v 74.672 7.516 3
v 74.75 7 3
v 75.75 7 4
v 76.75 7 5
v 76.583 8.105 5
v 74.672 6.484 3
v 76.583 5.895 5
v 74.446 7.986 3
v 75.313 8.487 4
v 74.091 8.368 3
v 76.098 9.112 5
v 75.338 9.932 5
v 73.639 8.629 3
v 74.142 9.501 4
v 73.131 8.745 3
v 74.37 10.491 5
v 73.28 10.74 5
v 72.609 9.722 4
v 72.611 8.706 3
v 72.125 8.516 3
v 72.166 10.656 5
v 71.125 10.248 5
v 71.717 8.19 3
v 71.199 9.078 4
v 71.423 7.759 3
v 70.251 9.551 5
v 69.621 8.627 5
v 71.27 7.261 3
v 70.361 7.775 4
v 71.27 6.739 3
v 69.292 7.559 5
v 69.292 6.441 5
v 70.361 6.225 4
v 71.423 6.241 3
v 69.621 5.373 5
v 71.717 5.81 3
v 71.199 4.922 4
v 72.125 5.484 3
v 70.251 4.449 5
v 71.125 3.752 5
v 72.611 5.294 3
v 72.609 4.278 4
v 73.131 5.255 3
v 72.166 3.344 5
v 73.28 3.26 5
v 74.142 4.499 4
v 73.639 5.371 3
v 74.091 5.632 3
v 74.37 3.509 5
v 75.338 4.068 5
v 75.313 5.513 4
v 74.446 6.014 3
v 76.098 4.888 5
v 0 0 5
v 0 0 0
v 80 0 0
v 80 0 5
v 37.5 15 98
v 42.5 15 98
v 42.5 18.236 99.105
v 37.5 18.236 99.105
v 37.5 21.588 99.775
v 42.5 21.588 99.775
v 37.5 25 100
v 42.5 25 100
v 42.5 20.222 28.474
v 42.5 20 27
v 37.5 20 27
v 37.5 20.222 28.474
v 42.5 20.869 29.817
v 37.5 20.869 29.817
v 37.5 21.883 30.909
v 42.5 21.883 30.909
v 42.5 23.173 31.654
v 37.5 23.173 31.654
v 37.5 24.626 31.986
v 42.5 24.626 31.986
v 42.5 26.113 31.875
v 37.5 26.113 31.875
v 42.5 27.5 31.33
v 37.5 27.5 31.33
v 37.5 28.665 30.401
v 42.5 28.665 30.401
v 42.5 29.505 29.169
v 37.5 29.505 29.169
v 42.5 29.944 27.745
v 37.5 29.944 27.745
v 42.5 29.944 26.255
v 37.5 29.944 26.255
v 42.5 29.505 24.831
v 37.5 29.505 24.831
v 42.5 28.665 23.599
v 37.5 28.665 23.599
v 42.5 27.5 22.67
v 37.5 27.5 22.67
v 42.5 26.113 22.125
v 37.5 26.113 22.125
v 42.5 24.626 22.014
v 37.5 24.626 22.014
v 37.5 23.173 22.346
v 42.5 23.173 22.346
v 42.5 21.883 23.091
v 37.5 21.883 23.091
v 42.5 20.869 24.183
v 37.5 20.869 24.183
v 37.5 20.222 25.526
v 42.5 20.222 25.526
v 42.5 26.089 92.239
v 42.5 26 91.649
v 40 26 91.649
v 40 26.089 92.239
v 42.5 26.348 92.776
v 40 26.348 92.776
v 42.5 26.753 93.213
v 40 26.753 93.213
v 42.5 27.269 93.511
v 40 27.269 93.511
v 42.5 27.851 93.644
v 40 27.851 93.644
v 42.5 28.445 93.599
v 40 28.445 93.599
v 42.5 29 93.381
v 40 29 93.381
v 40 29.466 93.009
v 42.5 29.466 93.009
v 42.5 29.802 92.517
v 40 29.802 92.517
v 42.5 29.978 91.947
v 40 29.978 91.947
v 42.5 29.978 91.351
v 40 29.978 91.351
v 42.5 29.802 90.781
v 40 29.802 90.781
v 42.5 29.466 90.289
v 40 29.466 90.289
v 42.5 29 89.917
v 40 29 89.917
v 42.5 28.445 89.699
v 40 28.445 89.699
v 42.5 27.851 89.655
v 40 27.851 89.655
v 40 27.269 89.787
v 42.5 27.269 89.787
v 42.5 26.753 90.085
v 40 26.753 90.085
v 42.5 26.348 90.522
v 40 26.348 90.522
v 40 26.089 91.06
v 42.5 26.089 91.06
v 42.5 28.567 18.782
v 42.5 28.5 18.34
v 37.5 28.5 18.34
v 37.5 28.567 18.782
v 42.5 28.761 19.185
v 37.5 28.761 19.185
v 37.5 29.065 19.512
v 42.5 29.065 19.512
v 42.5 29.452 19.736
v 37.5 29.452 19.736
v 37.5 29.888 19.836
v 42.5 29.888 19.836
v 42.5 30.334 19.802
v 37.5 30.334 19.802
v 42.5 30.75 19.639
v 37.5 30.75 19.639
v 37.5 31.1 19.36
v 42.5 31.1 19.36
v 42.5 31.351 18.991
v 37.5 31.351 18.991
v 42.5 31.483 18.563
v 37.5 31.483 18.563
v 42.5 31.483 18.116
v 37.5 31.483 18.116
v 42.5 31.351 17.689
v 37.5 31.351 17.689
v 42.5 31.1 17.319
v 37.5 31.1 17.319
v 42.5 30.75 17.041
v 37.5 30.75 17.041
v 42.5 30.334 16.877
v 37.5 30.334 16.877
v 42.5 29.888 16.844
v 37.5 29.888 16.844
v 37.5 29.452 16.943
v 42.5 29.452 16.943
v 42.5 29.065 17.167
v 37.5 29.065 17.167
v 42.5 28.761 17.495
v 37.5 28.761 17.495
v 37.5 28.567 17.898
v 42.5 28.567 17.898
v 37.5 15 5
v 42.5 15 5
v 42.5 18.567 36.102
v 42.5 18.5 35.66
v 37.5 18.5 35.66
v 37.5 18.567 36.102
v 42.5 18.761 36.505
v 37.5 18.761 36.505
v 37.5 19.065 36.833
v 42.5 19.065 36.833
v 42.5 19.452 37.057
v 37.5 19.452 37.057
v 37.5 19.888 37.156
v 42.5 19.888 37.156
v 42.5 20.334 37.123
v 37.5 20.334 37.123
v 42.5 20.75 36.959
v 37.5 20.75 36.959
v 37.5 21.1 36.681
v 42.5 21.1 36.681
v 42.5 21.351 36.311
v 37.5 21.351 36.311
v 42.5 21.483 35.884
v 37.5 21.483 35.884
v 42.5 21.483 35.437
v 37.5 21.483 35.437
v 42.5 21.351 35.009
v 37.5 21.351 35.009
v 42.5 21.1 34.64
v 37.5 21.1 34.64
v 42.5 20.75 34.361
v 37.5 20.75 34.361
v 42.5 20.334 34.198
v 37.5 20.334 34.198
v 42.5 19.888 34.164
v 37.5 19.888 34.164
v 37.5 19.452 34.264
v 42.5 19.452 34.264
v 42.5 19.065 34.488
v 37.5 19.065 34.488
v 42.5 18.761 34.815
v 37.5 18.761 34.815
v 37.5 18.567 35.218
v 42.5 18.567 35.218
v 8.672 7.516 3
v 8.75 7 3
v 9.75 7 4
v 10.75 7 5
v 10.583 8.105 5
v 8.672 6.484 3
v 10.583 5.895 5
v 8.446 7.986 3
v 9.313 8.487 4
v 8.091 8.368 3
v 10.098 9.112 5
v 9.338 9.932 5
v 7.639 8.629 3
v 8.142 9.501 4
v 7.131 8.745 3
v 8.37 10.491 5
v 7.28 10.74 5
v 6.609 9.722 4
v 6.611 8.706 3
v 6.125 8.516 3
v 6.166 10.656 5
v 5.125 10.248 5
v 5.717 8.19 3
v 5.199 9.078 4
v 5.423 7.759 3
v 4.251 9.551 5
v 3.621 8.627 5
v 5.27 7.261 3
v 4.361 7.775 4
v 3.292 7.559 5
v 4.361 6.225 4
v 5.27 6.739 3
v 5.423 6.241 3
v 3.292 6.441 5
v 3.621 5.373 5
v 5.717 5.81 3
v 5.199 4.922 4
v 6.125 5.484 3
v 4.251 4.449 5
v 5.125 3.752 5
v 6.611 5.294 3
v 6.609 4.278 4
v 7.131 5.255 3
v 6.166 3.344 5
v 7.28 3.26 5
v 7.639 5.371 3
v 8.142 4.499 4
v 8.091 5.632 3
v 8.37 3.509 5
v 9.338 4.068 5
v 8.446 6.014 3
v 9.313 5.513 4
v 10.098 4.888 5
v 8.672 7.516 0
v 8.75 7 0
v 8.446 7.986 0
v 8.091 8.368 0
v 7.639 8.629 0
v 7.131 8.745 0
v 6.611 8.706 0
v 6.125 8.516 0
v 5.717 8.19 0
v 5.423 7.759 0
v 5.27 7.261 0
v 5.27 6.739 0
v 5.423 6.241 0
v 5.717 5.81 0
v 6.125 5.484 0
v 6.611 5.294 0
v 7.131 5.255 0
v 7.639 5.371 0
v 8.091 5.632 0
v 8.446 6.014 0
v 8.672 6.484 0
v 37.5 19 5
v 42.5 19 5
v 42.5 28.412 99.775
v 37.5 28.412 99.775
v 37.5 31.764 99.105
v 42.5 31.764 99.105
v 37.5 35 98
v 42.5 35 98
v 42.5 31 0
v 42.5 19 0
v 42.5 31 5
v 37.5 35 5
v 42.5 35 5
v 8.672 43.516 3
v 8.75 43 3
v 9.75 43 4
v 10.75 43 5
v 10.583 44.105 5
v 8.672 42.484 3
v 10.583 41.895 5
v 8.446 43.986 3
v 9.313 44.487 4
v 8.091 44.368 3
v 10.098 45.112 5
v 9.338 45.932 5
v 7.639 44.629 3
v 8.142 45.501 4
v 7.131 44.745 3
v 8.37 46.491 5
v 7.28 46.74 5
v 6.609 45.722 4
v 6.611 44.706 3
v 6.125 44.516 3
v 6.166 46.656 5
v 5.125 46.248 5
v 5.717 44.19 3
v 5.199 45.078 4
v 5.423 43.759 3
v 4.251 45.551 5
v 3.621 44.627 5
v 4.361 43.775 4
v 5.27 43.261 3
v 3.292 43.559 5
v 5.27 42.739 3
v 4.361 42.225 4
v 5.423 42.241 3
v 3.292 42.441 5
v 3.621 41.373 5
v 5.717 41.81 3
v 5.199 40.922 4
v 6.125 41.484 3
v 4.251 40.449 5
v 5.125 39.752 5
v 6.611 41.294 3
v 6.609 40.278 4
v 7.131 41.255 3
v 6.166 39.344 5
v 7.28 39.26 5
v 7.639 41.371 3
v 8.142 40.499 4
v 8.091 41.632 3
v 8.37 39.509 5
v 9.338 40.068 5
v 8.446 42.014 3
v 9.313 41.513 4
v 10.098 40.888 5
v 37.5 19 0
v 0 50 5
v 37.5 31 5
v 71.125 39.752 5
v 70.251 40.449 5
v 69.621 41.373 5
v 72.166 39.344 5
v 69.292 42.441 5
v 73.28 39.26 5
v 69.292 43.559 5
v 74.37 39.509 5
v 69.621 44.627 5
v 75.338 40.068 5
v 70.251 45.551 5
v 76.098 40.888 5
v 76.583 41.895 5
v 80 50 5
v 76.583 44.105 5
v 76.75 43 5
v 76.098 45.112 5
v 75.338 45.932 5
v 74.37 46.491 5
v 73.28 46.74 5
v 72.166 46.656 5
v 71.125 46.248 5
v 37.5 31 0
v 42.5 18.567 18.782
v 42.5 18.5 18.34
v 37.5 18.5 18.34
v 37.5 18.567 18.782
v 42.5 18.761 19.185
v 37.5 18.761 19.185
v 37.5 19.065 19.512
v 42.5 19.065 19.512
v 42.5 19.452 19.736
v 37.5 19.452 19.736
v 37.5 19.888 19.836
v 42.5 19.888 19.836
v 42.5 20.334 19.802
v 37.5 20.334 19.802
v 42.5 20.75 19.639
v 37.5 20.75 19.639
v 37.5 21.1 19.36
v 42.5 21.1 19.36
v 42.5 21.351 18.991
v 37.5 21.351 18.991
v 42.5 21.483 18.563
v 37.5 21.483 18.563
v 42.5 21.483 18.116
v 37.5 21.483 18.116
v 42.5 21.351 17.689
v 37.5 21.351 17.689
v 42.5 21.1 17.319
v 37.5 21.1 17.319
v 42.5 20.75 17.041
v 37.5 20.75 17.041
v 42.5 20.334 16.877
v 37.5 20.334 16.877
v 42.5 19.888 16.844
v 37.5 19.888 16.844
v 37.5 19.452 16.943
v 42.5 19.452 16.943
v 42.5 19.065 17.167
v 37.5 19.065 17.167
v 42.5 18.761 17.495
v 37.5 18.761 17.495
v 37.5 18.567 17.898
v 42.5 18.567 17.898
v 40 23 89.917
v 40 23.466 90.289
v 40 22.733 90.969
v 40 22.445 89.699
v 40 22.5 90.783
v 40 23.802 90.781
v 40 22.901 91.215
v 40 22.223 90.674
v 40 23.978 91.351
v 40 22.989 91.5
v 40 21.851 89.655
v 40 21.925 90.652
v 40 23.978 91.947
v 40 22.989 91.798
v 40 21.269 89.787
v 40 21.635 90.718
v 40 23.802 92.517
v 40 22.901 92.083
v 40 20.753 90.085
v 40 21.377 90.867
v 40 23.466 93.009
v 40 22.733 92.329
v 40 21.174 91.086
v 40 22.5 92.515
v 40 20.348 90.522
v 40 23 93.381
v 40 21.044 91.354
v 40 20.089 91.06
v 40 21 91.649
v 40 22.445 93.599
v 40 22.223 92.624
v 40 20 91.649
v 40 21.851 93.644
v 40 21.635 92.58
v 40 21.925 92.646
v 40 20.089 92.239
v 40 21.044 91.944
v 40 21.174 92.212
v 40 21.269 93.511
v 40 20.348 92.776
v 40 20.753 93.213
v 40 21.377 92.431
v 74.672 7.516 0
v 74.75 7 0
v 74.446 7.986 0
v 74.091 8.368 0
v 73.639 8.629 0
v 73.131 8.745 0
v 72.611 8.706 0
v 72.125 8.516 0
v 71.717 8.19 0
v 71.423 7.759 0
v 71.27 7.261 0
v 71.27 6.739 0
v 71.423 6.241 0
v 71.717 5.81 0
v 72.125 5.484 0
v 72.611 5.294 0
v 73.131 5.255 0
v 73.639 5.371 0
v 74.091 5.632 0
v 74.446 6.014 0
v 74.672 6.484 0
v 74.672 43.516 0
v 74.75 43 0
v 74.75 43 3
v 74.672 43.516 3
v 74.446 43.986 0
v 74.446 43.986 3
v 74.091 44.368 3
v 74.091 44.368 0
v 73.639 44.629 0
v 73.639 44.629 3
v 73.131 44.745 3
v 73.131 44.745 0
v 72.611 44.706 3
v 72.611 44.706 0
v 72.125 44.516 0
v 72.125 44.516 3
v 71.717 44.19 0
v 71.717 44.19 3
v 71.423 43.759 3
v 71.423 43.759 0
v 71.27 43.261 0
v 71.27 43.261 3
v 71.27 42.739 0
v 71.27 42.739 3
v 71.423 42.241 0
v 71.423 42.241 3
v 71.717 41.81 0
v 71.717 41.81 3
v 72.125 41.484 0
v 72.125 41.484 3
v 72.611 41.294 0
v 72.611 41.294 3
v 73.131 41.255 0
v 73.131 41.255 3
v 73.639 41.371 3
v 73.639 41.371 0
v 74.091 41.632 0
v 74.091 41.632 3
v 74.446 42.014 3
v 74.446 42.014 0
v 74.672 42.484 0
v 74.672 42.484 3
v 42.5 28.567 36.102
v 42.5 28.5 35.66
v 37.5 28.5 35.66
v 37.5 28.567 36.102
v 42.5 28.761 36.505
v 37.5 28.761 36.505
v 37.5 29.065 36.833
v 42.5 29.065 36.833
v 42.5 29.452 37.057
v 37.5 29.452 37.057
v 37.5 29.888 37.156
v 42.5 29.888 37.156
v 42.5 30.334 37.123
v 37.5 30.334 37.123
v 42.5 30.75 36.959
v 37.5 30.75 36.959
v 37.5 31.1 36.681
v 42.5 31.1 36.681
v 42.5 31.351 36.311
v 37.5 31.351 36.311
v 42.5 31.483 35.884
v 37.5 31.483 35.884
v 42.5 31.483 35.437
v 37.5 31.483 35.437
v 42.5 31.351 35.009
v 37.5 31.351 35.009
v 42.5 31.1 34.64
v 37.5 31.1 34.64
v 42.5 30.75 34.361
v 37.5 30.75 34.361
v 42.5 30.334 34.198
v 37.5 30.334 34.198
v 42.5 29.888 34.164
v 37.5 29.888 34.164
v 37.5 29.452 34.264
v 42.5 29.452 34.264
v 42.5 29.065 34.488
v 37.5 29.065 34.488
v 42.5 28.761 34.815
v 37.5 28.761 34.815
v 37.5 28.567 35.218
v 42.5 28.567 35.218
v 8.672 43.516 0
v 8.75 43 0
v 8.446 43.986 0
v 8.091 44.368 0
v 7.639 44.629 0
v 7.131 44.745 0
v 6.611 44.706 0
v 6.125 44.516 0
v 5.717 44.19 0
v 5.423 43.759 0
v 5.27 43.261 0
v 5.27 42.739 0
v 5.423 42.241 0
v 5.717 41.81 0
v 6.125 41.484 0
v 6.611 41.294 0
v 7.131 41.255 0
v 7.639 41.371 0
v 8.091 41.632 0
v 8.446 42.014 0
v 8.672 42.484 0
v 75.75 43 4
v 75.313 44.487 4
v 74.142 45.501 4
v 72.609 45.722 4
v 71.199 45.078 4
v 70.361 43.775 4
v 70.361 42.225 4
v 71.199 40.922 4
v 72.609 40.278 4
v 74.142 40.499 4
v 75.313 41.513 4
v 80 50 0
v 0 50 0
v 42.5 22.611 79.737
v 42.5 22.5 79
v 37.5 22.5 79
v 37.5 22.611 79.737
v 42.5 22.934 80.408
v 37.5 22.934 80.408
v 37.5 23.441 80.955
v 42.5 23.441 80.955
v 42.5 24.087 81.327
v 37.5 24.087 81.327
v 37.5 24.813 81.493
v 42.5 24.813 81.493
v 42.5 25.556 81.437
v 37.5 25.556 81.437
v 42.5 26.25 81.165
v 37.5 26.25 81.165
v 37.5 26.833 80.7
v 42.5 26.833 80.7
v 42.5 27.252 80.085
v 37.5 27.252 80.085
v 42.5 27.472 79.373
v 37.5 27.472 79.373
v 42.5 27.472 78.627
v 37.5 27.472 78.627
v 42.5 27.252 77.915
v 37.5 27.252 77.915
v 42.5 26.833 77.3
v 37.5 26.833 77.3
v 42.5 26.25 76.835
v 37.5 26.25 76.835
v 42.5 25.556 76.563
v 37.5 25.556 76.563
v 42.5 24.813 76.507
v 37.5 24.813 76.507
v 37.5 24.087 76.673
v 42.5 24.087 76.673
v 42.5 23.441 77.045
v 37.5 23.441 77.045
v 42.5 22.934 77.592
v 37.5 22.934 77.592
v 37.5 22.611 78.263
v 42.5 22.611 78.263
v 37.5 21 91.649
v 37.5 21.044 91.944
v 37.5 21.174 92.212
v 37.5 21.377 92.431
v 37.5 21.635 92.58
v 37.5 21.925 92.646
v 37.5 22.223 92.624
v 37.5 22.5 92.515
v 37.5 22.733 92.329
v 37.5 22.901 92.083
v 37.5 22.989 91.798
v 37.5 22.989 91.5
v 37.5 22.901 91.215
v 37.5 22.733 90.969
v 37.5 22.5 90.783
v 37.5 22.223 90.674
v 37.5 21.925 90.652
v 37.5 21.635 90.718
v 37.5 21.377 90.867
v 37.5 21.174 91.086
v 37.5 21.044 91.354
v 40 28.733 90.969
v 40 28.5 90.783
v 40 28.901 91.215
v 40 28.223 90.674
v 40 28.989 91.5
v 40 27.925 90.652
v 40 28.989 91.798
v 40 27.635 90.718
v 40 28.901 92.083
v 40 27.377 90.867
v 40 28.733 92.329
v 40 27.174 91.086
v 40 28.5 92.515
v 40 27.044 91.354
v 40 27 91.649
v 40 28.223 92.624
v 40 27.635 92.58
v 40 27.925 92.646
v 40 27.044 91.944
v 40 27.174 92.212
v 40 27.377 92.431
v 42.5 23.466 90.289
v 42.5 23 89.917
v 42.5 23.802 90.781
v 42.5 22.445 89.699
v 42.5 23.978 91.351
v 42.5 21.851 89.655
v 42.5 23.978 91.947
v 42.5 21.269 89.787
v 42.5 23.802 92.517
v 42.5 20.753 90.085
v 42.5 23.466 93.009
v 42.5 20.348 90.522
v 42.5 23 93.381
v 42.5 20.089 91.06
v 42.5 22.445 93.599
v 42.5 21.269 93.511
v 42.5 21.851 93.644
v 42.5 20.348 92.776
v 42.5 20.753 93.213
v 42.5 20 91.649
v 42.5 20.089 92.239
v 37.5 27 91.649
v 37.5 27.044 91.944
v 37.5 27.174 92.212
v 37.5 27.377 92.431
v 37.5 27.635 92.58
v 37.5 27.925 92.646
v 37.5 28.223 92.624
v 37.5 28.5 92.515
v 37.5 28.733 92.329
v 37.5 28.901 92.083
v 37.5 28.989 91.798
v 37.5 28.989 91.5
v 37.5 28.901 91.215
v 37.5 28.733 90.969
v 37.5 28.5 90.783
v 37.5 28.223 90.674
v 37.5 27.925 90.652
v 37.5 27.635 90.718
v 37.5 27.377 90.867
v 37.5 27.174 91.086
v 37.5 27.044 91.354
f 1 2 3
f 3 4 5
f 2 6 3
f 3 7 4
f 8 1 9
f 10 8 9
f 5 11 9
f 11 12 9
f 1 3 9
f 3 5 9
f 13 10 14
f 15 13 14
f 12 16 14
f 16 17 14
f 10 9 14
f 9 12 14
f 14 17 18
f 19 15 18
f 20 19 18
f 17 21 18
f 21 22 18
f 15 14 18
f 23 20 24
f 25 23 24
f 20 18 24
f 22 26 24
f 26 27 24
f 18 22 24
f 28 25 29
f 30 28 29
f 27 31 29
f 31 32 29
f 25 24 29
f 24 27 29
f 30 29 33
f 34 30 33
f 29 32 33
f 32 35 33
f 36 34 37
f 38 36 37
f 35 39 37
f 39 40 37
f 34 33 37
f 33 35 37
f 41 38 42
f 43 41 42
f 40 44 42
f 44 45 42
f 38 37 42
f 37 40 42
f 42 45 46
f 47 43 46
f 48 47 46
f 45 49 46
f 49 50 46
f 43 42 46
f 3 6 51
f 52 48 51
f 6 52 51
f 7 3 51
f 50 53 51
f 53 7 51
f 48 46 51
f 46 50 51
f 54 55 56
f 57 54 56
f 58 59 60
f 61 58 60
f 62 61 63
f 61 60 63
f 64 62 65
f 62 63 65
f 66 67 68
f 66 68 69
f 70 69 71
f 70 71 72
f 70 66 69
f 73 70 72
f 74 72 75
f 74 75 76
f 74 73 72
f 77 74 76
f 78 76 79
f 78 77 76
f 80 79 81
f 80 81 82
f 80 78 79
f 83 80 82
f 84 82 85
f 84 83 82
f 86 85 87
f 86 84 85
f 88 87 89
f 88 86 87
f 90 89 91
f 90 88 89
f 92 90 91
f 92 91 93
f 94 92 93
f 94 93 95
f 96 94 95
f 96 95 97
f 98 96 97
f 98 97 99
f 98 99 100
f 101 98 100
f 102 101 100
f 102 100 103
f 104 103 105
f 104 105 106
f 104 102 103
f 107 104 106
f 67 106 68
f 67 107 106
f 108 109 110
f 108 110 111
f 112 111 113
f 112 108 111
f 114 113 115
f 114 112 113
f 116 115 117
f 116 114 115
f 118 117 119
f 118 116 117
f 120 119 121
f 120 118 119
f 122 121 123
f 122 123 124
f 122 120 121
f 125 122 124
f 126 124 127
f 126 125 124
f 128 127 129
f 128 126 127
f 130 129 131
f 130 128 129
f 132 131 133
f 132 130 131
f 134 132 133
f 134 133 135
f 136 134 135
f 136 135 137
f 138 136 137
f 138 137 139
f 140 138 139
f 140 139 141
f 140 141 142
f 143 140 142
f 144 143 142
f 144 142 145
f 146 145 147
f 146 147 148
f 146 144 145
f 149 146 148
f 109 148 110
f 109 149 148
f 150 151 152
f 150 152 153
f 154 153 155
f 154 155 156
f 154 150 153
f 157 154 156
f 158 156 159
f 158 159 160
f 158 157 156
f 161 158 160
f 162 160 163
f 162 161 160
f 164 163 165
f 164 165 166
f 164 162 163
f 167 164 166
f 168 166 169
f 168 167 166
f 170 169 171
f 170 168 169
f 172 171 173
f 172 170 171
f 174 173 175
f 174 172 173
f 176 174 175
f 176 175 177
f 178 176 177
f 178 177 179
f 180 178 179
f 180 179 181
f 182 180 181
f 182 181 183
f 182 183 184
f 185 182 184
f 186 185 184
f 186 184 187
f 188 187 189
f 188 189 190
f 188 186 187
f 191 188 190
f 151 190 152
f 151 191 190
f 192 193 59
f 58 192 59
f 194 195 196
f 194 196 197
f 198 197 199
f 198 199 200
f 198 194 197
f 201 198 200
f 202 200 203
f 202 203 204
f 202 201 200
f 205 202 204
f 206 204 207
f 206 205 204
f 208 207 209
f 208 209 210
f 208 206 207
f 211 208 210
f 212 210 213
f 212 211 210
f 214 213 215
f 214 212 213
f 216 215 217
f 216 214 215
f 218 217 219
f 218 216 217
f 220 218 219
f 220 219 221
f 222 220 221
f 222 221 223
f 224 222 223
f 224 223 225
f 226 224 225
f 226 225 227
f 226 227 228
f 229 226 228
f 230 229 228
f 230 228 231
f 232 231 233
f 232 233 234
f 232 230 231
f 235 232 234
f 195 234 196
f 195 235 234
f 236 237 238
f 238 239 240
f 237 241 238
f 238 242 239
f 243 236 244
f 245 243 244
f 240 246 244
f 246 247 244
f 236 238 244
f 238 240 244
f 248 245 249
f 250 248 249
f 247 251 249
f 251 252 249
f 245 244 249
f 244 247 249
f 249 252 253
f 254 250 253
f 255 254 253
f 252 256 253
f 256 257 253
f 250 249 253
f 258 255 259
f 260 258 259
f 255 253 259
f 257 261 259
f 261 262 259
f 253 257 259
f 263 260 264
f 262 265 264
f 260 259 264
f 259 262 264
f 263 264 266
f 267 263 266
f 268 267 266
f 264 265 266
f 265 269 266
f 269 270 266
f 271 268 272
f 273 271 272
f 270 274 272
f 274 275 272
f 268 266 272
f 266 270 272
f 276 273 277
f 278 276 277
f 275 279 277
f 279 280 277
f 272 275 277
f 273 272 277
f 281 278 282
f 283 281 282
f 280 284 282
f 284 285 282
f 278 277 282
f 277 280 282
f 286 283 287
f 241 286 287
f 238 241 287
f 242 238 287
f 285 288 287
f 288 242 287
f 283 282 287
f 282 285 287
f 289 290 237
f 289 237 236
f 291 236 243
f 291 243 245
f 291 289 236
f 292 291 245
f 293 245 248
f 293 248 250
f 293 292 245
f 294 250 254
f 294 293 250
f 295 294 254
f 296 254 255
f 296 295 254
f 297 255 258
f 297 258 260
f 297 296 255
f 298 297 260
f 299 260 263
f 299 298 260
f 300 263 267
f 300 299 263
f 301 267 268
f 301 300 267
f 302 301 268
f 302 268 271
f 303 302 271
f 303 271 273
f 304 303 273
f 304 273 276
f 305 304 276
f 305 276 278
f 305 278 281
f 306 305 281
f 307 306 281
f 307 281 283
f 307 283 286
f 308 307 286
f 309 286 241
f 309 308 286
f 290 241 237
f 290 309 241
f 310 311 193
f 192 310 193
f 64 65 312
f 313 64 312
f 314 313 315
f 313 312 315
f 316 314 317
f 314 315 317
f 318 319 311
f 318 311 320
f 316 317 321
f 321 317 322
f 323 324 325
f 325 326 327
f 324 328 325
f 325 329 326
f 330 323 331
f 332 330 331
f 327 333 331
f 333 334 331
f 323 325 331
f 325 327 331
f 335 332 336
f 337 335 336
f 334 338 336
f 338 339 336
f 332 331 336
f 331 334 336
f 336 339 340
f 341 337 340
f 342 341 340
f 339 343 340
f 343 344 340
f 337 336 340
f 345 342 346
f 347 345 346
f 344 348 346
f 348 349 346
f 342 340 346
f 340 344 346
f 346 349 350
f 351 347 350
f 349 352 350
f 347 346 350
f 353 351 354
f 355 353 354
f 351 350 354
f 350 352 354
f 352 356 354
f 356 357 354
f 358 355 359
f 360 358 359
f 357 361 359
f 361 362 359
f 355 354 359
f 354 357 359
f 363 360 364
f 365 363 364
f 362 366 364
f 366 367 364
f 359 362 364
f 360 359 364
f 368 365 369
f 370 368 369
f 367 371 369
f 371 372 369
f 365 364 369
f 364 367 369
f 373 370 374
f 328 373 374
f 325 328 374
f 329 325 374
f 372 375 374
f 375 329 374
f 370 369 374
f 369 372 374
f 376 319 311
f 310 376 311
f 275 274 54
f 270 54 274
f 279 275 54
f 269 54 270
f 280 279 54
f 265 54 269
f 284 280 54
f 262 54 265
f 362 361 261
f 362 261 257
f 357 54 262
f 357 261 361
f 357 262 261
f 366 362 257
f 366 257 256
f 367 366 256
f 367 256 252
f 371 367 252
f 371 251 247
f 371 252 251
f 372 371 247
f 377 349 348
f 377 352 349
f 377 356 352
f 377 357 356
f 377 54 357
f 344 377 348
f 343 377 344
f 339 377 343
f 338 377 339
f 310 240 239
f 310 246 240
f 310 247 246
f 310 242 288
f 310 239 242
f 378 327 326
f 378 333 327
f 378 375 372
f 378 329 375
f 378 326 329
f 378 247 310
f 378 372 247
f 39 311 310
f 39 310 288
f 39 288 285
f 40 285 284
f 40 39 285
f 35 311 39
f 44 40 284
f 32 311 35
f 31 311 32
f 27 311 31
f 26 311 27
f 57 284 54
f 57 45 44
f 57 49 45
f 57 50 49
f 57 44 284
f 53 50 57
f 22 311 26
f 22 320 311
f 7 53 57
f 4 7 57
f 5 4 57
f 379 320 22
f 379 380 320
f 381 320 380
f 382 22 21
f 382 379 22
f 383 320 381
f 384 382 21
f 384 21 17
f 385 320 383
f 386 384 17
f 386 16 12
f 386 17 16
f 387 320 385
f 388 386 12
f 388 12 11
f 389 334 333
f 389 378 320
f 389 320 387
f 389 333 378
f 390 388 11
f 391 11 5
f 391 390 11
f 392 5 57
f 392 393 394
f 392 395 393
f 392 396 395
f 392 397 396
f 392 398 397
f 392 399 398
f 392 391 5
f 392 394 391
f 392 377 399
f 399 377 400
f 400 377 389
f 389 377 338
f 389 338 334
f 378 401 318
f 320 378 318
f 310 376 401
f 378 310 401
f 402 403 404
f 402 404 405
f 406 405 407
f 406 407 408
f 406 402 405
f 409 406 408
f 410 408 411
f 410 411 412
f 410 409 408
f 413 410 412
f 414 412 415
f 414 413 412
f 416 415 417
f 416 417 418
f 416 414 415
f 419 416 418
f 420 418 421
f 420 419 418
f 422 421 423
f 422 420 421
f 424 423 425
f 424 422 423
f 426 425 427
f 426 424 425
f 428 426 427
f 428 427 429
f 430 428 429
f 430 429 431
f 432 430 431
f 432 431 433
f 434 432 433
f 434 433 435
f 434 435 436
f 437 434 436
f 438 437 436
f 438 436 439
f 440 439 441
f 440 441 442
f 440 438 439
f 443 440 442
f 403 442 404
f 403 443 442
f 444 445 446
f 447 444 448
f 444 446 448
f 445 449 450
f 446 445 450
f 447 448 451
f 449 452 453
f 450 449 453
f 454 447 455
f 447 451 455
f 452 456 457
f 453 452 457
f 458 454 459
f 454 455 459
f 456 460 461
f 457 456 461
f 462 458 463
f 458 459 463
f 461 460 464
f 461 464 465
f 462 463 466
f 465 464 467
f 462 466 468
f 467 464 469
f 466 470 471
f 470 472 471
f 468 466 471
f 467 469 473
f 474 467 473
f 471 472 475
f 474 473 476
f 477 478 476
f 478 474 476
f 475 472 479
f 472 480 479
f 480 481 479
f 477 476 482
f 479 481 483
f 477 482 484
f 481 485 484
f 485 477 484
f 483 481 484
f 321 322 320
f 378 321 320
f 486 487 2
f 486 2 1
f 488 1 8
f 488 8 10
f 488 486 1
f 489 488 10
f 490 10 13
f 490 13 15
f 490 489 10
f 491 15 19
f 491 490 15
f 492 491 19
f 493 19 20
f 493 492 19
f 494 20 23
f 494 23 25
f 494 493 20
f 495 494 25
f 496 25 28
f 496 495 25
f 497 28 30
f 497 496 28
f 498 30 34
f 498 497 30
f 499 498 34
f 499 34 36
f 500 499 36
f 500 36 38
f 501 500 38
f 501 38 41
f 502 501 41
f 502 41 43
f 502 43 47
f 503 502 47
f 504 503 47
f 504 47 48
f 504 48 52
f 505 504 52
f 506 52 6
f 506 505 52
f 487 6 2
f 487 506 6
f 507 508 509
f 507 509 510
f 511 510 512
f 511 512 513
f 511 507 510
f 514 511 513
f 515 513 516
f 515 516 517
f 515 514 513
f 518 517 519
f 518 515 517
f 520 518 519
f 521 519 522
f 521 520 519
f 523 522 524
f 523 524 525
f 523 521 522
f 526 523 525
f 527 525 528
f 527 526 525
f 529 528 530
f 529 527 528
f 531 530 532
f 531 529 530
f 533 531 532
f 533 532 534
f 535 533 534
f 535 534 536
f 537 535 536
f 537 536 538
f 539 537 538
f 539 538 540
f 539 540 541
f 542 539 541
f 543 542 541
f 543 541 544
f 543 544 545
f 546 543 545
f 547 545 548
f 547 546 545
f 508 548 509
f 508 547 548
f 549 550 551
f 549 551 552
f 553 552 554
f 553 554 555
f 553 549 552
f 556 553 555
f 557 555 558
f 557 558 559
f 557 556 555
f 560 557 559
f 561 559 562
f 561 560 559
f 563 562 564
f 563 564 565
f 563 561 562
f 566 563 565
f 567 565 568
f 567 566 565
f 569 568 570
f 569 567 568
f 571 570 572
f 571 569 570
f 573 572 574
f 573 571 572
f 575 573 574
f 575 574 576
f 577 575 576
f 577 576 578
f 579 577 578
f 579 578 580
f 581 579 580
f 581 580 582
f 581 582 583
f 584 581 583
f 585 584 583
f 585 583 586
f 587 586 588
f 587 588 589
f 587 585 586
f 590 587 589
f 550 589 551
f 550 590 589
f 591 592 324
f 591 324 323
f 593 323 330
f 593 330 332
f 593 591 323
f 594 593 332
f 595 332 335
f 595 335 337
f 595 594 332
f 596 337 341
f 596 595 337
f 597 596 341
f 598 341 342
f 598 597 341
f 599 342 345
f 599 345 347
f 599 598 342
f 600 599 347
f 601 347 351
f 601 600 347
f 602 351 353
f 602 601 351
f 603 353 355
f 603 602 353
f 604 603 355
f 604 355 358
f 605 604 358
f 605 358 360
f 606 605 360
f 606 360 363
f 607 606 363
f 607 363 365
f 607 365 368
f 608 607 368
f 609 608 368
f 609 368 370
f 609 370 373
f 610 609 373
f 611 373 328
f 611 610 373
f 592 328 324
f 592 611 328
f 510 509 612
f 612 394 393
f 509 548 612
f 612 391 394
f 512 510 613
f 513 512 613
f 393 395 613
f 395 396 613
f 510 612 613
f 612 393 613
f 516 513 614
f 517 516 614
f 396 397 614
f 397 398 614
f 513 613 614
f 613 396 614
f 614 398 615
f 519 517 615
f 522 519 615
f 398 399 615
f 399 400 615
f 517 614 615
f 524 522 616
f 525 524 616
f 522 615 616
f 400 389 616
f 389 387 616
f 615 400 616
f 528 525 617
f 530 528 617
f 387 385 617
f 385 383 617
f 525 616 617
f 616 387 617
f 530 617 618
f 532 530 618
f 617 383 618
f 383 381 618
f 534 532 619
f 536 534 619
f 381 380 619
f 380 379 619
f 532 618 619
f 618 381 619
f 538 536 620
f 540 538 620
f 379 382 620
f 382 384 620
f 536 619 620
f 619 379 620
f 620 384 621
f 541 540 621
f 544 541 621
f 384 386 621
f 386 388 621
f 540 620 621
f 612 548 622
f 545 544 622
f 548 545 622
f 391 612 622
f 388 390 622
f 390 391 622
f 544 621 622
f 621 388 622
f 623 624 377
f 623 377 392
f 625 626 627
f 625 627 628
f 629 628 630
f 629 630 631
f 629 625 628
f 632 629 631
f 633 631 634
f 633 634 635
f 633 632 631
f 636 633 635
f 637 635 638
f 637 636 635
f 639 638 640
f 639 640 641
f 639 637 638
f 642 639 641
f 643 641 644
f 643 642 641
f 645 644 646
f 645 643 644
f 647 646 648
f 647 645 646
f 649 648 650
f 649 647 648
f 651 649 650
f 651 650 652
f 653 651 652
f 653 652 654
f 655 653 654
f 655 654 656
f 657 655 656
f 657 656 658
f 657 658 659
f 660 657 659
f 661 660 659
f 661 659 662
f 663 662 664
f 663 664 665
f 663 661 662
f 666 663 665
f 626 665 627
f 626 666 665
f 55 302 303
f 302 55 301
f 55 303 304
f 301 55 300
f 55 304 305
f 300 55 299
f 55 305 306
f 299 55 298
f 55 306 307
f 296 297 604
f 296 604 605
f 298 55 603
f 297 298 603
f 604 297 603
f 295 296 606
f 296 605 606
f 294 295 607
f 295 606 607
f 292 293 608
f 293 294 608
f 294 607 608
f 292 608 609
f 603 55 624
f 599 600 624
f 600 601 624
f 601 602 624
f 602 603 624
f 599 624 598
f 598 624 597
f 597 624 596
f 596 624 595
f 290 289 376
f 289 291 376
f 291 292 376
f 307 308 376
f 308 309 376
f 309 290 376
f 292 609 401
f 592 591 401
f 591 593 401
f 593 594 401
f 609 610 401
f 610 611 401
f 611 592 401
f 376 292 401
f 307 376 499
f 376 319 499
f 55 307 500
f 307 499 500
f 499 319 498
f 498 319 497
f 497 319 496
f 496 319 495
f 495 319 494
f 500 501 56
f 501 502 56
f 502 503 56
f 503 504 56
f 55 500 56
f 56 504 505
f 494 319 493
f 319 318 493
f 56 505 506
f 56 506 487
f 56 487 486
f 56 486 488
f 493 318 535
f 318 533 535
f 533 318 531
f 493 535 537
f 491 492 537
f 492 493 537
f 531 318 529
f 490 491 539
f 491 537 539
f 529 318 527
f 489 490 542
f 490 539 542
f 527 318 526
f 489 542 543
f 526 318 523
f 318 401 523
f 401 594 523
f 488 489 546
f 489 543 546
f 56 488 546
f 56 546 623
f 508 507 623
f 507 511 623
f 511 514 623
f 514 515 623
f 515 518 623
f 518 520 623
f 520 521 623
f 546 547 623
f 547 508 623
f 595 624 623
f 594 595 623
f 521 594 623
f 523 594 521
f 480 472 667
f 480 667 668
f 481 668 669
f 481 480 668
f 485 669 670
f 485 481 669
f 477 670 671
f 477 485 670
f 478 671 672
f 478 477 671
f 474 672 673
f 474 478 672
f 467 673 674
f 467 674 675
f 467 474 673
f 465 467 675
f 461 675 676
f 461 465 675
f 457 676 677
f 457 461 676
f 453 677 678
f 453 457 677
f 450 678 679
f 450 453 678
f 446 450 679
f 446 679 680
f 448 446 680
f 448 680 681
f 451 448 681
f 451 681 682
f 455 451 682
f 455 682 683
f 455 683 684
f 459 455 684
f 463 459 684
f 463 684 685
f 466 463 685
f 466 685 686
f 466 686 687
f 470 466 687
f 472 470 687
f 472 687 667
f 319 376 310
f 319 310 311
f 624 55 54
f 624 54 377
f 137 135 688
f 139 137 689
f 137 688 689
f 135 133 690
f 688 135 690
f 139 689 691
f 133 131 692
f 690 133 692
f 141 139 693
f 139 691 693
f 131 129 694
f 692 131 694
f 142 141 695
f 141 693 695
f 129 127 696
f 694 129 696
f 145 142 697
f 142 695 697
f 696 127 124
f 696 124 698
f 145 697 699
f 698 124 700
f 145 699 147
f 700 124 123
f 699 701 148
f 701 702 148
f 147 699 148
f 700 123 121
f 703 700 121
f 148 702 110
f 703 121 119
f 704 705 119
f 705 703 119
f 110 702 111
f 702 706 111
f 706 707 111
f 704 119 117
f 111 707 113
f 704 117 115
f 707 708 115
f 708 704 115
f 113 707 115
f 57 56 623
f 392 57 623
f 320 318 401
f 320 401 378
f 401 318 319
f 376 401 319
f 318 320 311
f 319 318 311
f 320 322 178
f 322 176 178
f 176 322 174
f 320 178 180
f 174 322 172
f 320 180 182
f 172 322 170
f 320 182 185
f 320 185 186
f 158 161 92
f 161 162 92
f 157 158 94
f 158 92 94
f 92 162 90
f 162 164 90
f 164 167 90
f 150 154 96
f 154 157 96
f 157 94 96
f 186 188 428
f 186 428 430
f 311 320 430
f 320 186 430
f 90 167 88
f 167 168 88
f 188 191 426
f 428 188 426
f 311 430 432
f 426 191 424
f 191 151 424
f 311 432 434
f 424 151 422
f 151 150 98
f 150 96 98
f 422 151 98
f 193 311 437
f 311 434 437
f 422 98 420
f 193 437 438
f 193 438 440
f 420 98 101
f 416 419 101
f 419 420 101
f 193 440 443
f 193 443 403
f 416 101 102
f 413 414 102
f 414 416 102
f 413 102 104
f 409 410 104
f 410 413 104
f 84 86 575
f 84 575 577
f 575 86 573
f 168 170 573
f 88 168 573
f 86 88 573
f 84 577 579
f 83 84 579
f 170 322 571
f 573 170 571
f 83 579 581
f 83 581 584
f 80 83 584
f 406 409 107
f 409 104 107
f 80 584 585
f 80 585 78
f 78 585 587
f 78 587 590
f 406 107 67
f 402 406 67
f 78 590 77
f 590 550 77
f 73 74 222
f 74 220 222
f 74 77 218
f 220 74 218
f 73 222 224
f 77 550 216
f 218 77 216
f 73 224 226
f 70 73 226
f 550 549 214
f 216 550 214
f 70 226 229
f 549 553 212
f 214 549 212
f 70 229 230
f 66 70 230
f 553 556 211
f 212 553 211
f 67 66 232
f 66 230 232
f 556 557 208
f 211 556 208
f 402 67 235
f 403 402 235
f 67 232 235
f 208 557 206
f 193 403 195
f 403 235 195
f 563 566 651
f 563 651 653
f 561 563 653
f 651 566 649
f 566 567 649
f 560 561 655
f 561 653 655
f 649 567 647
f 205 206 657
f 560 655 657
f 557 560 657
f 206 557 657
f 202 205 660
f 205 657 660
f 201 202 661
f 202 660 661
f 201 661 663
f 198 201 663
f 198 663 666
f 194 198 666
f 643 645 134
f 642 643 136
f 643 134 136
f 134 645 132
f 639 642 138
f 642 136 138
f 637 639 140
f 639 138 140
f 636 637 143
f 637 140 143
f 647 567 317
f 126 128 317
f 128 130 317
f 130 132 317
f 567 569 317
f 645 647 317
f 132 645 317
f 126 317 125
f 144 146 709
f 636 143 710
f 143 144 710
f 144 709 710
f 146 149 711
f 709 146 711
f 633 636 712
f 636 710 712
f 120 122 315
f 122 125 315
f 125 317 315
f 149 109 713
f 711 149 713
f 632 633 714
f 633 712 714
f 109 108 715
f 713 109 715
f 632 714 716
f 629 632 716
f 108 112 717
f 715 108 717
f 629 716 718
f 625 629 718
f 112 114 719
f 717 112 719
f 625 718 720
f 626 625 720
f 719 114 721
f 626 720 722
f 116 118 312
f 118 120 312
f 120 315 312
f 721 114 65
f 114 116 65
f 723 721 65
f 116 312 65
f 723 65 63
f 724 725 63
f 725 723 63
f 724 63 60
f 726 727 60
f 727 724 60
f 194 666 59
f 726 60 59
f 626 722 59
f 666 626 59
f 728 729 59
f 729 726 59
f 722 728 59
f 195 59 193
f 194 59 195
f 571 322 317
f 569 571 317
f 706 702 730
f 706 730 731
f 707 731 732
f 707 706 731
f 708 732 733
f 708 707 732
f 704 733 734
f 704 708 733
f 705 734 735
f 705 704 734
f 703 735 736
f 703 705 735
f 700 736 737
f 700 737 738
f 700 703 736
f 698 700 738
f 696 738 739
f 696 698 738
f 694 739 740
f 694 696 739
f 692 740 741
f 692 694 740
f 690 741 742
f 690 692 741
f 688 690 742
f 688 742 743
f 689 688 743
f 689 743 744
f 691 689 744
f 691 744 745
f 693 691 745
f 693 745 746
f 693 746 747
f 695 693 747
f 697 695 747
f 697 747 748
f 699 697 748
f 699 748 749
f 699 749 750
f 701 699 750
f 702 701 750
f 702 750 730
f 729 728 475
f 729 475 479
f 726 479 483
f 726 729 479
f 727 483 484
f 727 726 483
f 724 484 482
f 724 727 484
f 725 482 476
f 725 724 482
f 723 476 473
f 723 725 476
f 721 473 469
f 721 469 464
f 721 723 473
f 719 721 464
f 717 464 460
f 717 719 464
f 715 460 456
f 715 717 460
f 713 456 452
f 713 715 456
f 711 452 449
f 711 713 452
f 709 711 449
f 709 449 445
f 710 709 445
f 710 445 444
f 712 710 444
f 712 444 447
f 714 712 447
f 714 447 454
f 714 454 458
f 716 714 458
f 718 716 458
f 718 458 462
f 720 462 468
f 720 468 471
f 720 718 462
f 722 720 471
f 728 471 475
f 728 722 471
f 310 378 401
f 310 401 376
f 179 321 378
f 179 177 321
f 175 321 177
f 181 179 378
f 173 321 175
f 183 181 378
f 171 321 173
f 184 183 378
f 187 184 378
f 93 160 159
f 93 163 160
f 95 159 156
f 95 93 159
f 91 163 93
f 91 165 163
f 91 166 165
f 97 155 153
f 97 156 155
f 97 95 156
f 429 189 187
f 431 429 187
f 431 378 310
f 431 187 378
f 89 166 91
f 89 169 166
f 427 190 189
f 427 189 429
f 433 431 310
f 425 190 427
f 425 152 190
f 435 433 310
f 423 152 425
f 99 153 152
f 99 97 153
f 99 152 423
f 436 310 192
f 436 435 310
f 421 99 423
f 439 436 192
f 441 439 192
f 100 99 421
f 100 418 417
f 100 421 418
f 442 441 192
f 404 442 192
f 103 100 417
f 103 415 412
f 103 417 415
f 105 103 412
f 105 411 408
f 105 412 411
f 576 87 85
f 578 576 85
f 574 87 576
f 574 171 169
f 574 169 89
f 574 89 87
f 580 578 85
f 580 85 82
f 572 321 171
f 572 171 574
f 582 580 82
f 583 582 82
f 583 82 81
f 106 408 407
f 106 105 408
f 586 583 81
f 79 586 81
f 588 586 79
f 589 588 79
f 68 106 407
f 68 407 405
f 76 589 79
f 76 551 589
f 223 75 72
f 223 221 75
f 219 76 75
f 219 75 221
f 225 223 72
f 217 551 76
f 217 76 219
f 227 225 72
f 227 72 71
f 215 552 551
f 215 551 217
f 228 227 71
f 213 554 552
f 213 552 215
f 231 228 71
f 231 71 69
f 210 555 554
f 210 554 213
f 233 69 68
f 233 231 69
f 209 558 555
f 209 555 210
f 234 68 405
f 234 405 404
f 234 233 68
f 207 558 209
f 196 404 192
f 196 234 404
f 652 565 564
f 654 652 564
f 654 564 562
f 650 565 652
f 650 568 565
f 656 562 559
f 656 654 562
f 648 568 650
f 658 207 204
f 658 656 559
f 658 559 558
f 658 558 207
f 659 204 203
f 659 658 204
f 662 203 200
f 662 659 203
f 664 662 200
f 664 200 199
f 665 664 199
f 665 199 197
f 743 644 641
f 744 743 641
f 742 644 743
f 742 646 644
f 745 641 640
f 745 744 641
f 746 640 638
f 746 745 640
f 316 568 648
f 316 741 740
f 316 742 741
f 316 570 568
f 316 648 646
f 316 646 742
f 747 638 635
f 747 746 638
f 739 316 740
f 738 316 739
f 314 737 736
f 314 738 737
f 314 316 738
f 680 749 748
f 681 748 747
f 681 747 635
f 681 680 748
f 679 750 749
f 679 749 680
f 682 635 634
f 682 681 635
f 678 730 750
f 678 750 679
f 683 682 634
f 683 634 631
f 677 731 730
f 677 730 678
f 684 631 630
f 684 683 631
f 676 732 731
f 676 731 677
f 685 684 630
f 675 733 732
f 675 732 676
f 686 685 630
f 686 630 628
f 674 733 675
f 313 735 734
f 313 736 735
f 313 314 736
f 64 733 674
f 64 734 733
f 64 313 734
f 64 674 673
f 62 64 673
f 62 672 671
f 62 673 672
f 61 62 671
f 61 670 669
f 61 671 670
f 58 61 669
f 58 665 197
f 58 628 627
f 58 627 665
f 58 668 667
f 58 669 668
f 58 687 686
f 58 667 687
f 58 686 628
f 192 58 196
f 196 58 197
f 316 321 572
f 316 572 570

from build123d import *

# Parameters (mm, degrees)
F0_W     = 80
F0_H     = 50
F0_R     = 1.75
F0_W_2   = 5
F0_H_2   = 12
F1_DEPTH = 5
F2_SIZE  = 2
F3_R     = 1.5
F3_R_2   = 5
F3_R_3   = 2
F3_R_4   = 2.5
F3_W     = 12
F3_H     = 5
F3_R_5   = 1
F4_DEPTH = 5
F5_DEPTH = 2.5


with BuildPart() as f1:
    # F0 (on Top) → F1 (new body)
    with BuildSketch(Plane.XY):
        with Locations((40, 25)):
            Rectangle(F0_W, F0_H)
        with Locations((7, 7)):
            Circle(F0_R, mode=Mode.SUBTRACT)
        with Locations((73, 7)):
            Circle(F0_R, mode=Mode.SUBTRACT)
        with Locations((7, 43)):
            Circle(F0_R, mode=Mode.SUBTRACT)
        with Locations((40, 25)):
            Rectangle(F0_W_2, F0_H_2, mode=Mode.SUBTRACT)
        with Locations((73, 43)):
            Circle(F0_R, mode=Mode.SUBTRACT)
    extrude(amount=F1_DEPTH)

    # F2
    f2_edges = [f1.edges().sort_by_distance(p)[0] for p in [
        (5.25, 43, 5),
        (71.25, 43, 5),
        (71.25, 7, 5),
        (5.25, 7, 5),
    ]]
    chamfer(f2_edges, length=F2_SIZE)


with BuildPart() as f4:
    # F3 (on face) → F4 (new body)
    with BuildSketch(Plane(origin=(42.5, 0, 0), x_dir=(0, -1, 0), z_dir=(-1, 0, 0))):
        with BuildLine():
            Line((-35, 5), (-31, 5))
            Line((-31, 5), (-19, 5))
            Line((-19, 5), (-15, 5))
            Line((-15, 5), (-15, 98))
            ThreePointArc((-15, 98), (-19.90098, 99.495098), (-25, 100))
            ThreePointArc((-25, 100), (-30.09902, 99.495098), (-35, 98))
            Line((-35, 98), (-35, 5))
        make_face()
        with Locations((-30, 18.339746)):
            Circle(F3_R, mode=Mode.SUBTRACT)
        with Locations((-30, 35.660254)):
            Circle(F3_R, mode=Mode.SUBTRACT)
        with Locations((-20, 18.339746)):
            Circle(F3_R, mode=Mode.SUBTRACT)
        with Locations((-25, 27)):
            Circle(F3_R_2, mode=Mode.SUBTRACT)
        with Locations((-20, 35.660254)):
            Circle(F3_R, mode=Mode.SUBTRACT)
        with Locations((-28, 91.649111)):
            Circle(F3_R_3, mode=Mode.SUBTRACT)
        with Locations((-25, 79)):
            Circle(F3_R_4, mode=Mode.SUBTRACT)
        with Locations((-22, 91.649111)):
            Circle(F3_R_3, mode=Mode.SUBTRACT)
        with Locations((-25, 2.5)):
            Rectangle(F3_W, F3_H)
        with Locations((-22, 91.649111)):
            Circle(F3_R_3)
        with Locations((-22, 91.649111)):
            Circle(F3_R_5, mode=Mode.SUBTRACT)
        with Locations((-28, 91.649111)):
            Circle(F3_R_3)
        with Locations((-28, 91.649111)):
            Circle(F3_R_5, mode=Mode.SUBTRACT)
    extrude(amount=F4_DEPTH)

    # F3 (on face) → F5 (cut)
    with BuildSketch(Plane(origin=(42.5, 0, 0), x_dir=(0, -1, 0), z_dir=(-1, 0, 0))):
        with Locations((-22, 91.649111)):
            Circle(F3_R_3)
        with Locations((-22, 91.649111)):
            Circle(F3_R_5, mode=Mode.SUBTRACT)
        with Locations((-28, 91.649111)):
            Circle(F3_R_3)
        with Locations((-28, 91.649111)):
            Circle(F3_R_5, mode=Mode.SUBTRACT)
    extrude(amount=F5_DEPTH, mode=Mode.SUBTRACT)


solid = Compound([f1.part, f4.part])
